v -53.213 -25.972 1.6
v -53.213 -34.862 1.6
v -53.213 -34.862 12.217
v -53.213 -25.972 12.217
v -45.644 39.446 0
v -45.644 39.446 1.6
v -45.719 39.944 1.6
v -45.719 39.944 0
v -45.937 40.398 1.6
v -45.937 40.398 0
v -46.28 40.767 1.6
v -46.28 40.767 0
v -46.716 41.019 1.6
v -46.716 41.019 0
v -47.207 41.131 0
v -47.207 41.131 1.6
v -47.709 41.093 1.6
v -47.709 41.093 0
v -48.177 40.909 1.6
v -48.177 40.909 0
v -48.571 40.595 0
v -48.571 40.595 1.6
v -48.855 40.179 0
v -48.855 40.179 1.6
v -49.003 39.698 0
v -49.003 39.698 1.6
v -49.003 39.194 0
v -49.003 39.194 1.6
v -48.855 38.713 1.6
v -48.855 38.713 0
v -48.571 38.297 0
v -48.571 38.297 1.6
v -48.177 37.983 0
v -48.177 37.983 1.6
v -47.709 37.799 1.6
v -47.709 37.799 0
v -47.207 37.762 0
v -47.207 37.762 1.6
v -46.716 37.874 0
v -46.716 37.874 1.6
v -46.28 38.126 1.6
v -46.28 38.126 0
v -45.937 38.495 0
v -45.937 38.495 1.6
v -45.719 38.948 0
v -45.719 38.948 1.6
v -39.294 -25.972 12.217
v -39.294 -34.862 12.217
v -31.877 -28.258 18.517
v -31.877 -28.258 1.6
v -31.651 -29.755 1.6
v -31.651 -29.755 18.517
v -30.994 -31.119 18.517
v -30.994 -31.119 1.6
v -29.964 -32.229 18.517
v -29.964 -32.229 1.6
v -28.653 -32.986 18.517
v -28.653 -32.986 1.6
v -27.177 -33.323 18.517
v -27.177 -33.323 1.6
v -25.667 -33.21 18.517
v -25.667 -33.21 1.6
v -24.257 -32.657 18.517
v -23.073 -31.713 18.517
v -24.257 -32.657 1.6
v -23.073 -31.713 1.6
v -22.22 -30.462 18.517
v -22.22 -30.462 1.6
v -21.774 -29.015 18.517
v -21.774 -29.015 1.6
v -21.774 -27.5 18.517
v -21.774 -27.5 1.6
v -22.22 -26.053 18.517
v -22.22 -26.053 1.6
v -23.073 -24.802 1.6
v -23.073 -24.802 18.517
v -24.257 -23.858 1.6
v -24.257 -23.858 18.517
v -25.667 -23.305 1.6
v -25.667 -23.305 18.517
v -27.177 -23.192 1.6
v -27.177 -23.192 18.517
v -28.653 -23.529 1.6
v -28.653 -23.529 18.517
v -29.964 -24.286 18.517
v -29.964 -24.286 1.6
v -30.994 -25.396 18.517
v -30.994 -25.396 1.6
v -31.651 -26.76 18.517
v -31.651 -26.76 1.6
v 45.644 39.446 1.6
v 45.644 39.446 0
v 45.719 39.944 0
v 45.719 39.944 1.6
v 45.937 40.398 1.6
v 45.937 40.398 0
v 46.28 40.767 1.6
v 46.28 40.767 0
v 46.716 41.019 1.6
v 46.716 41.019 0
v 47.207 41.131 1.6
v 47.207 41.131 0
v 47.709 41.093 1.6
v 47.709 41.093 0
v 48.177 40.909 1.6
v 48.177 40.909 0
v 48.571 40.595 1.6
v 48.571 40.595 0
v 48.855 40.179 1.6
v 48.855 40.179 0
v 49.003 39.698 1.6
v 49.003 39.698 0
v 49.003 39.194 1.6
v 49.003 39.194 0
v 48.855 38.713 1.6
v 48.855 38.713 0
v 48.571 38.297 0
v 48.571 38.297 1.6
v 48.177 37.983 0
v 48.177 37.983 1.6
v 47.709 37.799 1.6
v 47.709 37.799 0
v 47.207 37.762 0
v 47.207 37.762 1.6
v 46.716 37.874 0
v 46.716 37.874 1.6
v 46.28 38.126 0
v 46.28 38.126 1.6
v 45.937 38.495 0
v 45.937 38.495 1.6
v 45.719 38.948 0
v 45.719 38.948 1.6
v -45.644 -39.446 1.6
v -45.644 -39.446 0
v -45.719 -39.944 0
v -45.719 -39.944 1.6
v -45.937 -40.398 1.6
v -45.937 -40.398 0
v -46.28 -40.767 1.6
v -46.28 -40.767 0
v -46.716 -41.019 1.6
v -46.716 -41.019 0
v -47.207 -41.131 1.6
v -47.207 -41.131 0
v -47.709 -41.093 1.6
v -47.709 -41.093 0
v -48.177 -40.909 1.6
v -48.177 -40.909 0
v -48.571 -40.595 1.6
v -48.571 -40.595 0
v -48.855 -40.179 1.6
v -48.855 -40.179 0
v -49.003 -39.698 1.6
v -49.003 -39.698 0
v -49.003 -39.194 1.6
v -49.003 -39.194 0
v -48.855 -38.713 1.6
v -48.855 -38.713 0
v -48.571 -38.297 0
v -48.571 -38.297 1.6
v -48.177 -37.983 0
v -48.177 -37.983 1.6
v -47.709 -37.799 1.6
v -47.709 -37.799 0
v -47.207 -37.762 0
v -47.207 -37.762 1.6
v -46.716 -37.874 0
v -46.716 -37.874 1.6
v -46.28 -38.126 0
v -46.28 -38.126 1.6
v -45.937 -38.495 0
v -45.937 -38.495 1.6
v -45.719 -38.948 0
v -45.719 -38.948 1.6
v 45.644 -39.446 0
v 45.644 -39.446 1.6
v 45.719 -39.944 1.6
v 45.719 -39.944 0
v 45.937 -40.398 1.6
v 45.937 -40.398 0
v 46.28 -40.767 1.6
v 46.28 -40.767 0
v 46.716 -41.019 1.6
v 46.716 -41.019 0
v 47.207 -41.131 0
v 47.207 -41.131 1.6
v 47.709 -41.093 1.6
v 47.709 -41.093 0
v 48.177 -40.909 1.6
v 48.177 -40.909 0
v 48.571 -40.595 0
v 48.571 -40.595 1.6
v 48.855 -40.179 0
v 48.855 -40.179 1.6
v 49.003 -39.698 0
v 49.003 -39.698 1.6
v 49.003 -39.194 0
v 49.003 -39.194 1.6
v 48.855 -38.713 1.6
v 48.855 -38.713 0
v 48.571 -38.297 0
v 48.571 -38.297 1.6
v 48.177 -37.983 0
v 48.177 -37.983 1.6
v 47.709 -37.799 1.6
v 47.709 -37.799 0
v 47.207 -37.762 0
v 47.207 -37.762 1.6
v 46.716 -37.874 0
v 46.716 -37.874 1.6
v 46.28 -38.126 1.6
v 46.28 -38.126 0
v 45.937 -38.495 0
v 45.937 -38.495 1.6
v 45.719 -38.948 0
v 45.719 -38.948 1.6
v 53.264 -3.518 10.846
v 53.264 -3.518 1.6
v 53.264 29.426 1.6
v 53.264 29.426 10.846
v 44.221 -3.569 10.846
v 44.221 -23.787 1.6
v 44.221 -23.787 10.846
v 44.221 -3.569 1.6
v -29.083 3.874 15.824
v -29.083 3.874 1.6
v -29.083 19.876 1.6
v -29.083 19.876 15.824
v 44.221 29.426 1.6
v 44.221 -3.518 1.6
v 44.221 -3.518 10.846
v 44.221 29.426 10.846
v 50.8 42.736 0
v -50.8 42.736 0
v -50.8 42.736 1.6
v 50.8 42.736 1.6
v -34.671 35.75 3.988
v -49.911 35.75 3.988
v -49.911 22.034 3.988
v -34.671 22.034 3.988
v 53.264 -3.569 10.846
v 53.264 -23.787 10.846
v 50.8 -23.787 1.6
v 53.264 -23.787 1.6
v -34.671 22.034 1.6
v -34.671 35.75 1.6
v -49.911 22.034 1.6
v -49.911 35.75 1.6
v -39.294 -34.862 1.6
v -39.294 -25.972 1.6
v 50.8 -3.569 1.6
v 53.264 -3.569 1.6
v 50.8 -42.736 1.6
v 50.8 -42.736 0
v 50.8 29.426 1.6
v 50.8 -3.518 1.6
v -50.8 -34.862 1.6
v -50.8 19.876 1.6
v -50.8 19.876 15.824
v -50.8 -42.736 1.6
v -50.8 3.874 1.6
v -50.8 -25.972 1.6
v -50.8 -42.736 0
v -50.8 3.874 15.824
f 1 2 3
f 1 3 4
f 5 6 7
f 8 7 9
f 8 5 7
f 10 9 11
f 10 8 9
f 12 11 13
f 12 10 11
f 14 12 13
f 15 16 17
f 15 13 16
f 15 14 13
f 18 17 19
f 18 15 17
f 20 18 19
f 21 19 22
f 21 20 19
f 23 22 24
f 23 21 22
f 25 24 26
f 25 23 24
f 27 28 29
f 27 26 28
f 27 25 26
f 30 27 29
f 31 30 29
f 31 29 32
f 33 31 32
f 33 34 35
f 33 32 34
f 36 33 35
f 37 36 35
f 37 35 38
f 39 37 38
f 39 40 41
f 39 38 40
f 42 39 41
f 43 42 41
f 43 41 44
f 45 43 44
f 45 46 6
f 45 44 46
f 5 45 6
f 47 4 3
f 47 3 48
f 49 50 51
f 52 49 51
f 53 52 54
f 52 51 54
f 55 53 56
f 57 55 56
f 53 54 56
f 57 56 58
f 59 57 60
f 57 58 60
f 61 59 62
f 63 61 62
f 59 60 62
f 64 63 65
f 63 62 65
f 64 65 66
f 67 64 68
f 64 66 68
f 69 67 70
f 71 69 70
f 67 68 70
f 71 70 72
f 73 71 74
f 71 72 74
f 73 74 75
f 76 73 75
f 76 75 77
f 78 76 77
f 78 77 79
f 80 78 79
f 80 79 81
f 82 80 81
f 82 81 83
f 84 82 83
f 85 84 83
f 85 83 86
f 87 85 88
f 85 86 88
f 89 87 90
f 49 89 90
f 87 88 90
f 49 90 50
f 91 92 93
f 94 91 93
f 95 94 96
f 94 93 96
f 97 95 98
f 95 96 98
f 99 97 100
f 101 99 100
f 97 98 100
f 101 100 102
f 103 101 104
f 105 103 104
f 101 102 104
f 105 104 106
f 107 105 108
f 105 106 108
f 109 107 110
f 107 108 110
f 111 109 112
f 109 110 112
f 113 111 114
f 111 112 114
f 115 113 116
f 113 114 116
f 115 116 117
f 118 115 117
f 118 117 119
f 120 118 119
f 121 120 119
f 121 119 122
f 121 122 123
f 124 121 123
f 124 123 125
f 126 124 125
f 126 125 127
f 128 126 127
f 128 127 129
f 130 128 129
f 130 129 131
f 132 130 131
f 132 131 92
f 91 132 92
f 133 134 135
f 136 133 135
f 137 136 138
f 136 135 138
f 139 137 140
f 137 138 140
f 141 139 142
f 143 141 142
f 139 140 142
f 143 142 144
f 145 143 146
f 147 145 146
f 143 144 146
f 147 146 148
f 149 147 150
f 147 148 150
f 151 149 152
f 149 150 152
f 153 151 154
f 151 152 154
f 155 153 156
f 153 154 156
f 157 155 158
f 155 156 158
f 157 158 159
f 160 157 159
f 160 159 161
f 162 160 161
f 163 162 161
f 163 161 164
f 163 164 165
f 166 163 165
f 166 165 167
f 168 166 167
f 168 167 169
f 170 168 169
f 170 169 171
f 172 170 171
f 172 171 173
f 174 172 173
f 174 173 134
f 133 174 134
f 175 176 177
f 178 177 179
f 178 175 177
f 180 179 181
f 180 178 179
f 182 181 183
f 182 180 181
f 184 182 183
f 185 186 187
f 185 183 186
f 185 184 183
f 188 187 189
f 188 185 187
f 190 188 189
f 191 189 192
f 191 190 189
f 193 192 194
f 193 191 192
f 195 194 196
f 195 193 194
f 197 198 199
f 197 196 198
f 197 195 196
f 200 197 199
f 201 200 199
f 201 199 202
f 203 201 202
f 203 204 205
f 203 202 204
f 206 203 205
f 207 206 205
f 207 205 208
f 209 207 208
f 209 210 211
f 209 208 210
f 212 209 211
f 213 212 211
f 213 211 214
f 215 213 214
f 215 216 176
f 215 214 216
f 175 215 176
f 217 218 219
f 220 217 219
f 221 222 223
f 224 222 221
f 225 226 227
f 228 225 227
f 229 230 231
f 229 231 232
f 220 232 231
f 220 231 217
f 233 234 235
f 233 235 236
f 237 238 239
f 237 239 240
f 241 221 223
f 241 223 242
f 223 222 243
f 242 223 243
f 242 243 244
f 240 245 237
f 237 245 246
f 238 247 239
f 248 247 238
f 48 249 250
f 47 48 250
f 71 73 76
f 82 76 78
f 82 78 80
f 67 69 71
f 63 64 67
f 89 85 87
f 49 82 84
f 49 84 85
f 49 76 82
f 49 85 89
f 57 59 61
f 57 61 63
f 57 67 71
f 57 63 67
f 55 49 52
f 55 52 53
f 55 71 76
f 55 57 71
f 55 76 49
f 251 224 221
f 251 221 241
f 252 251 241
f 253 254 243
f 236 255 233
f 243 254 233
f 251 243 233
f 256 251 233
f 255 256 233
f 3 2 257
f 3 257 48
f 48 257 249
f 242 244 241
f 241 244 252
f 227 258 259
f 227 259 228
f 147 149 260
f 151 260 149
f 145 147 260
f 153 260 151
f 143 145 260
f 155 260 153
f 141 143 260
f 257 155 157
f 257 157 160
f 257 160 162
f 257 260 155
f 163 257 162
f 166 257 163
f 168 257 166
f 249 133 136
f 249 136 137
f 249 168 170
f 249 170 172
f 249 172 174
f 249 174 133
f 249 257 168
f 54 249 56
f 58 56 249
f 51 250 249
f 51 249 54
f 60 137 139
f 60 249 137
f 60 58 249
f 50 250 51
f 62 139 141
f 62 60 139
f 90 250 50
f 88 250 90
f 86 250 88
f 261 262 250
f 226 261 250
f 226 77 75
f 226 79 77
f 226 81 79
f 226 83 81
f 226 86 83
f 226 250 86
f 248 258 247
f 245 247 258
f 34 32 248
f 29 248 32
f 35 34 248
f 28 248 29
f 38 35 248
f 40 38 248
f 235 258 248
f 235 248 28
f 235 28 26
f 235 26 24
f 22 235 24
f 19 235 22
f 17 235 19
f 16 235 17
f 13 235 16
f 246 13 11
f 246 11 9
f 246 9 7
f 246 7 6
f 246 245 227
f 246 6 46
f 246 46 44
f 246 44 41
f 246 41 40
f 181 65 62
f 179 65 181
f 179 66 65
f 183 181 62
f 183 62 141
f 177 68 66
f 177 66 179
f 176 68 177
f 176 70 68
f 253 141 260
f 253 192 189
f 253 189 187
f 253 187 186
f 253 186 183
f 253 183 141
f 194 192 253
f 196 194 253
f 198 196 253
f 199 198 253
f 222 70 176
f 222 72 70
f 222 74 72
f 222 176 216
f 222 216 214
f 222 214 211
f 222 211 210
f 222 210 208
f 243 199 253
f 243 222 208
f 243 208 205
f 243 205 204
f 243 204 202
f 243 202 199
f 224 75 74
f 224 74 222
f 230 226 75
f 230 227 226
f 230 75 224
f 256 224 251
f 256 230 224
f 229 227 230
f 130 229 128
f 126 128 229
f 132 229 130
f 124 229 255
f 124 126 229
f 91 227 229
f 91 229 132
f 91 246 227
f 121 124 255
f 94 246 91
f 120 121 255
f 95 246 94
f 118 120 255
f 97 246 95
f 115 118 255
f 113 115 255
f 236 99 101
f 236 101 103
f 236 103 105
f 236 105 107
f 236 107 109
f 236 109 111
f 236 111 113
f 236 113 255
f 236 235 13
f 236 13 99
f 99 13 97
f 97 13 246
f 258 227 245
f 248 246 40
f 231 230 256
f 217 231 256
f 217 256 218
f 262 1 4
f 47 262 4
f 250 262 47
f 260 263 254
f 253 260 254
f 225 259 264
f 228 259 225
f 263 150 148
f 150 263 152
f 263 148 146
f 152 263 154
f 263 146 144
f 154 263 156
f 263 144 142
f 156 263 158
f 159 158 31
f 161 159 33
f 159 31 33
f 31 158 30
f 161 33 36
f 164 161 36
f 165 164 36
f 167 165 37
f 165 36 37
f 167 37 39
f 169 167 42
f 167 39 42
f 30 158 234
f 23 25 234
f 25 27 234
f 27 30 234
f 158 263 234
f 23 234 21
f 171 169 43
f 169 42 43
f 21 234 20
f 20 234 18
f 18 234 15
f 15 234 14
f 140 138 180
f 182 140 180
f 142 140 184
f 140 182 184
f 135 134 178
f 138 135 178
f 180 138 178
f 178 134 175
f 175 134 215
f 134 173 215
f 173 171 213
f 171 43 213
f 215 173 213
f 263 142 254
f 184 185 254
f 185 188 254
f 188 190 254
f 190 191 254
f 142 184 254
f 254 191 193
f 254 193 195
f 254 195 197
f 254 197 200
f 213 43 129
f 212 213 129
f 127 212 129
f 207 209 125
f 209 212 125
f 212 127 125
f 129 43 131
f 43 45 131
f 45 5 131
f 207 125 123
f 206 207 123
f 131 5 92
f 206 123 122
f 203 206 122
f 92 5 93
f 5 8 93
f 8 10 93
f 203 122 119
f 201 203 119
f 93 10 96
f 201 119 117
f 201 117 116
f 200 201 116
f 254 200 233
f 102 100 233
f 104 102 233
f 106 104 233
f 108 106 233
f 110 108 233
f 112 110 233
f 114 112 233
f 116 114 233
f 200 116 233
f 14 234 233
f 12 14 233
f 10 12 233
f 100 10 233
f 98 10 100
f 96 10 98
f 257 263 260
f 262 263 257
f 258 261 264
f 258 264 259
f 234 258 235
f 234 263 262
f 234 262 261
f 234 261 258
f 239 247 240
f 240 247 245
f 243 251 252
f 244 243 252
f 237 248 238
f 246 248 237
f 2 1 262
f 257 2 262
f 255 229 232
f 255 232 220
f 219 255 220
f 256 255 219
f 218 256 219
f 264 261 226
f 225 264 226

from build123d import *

# Parameters (mm, degrees)
SKETCH1_W               = 101.6
SKETCH1_H               = 85.471
BOSS_EXTRUDE1_DEPTH     = 1.6002
SKETCH2_W               = 21.717
SKETCH2_H               = 16.002
ETHERNET_DEPTH          = 14.224
SKETCH3_W               = 13.9192
SKETCH3_H               = 8.89
POWER_CONNECTOR_DEPTH   = 10.6172
SKETCH4_W               = 9.0424
SKETCH4_H               = 32.9438
SKETCH4_H_2             = 20.2184
F_2X_CONNECTOR_DEPTH    = 9.2456
SKETCH6_W               = 15.24
SKETCH6_H               = 13.716
SD_CARD_DEPTH           = 2.3876
SKETCH7_R               = 5.08
CAPACATOR_DEPTH         = 16.9164
SKETCH5_R               = 1.6891
CORNER_HOLE_DEPTH       = 71.754645263
MIRROR2_COPY_1_SKETCH_R = 1.6891
MIRROR2_COPY_1_DEPTH    = 71.754645263


with BuildPart() as part:
    # Sketch1 → Boss-Extrude1 (new body)
    with BuildSketch(Plane.XY):
        Rectangle(SKETCH1_W, SKETCH1_H)
    extrude(amount=BOSS_EXTRUDE1_DEPTH)

    # Sketch2 → Ethernet (add)
    with BuildSketch(Plane.XY.offset(1.6002)):
        with Locations((-39.9415, 11.8745)):
            Rectangle(SKETCH2_W, SKETCH2_H)
    extrude(amount=ETHERNET_DEPTH)

    # Sketch3 → Power Connector (add)
    with BuildSketch(Plane.XY.offset(1.6002)):
        with Locations((-46.2534, -30.4165)):
            Rectangle(SKETCH3_W, SKETCH3_H)
    extrude(amount=POWER_CONNECTOR_DEPTH)

    # Sketch4 → 2x Connector (add)
    with BuildSketch(Plane.XY.offset(1.6002)):
        with Locations((48.7426, 12.954)):
            Rectangle(SKETCH4_W, SKETCH4_H)
        with Locations((48.7426, -13.6779)):
            Rectangle(SKETCH4_W, SKETCH4_H_2)
    extrude(amount=F_2X_CONNECTOR_DEPTH)

    # Sketch6 → SD Card (add)
    with BuildSketch(Plane.XY.offset(1.6002)):
        with Locations((-42.291, 28.8925)):
            Rectangle(SKETCH6_W, SKETCH6_H)
    extrude(amount=SD_CARD_DEPTH)

    # Sketch7 → Capacator (add)
    with BuildSketch(Plane.XY.offset(1.6002)):
        with Locations(Location((-26.797, -28.2575, 0), (0, 0, 180))):
            Circle(SKETCH7_R)
    extrude(amount=CAPACATOR_DEPTH)

    # Sketch5 → Corner Hole (cut, through all)
    with BuildSketch(Plane(origin=(0, 0, 0), x_dir=(-1, 0, 0), z_dir=(0, 0, -1))):
        with Locations((-47.3329, 39.4462)):
            Circle(SKETCH5_R)
    corner_hole = extrude(amount=-CORNER_HOLE_DEPTH, mode=Mode.SUBTRACT)

    # Mirror1: Corner Hole across plane
    add(corner_hole.mirror(Plane(origin=(0, 0, 0), x_dir=(0, 0, 1), z_dir=(1, 0, 0))), mode=Mode.SUBTRACT)

    # Mirror2: Corner Hole across plane
    add(corner_hole.mirror(Plane.ZX), mode=Mode.SUBTRACT)

    # Mirror2 copy 1 sketch → Mirror2 copy 1 (cut, through all)
    with BuildSketch(Plane(origin=(0, 0, 0), x_dir=(1, 0, 0), z_dir=(0, 0, -1))):
        with Locations((-47.3329, 39.4462)):
            Circle(MIRROR2_COPY_1_SKETCH_R)
    extrude(amount=-MIRROR2_COPY_1_DEPTH, mode=Mode.SUBTRACT)


solid = part.part
